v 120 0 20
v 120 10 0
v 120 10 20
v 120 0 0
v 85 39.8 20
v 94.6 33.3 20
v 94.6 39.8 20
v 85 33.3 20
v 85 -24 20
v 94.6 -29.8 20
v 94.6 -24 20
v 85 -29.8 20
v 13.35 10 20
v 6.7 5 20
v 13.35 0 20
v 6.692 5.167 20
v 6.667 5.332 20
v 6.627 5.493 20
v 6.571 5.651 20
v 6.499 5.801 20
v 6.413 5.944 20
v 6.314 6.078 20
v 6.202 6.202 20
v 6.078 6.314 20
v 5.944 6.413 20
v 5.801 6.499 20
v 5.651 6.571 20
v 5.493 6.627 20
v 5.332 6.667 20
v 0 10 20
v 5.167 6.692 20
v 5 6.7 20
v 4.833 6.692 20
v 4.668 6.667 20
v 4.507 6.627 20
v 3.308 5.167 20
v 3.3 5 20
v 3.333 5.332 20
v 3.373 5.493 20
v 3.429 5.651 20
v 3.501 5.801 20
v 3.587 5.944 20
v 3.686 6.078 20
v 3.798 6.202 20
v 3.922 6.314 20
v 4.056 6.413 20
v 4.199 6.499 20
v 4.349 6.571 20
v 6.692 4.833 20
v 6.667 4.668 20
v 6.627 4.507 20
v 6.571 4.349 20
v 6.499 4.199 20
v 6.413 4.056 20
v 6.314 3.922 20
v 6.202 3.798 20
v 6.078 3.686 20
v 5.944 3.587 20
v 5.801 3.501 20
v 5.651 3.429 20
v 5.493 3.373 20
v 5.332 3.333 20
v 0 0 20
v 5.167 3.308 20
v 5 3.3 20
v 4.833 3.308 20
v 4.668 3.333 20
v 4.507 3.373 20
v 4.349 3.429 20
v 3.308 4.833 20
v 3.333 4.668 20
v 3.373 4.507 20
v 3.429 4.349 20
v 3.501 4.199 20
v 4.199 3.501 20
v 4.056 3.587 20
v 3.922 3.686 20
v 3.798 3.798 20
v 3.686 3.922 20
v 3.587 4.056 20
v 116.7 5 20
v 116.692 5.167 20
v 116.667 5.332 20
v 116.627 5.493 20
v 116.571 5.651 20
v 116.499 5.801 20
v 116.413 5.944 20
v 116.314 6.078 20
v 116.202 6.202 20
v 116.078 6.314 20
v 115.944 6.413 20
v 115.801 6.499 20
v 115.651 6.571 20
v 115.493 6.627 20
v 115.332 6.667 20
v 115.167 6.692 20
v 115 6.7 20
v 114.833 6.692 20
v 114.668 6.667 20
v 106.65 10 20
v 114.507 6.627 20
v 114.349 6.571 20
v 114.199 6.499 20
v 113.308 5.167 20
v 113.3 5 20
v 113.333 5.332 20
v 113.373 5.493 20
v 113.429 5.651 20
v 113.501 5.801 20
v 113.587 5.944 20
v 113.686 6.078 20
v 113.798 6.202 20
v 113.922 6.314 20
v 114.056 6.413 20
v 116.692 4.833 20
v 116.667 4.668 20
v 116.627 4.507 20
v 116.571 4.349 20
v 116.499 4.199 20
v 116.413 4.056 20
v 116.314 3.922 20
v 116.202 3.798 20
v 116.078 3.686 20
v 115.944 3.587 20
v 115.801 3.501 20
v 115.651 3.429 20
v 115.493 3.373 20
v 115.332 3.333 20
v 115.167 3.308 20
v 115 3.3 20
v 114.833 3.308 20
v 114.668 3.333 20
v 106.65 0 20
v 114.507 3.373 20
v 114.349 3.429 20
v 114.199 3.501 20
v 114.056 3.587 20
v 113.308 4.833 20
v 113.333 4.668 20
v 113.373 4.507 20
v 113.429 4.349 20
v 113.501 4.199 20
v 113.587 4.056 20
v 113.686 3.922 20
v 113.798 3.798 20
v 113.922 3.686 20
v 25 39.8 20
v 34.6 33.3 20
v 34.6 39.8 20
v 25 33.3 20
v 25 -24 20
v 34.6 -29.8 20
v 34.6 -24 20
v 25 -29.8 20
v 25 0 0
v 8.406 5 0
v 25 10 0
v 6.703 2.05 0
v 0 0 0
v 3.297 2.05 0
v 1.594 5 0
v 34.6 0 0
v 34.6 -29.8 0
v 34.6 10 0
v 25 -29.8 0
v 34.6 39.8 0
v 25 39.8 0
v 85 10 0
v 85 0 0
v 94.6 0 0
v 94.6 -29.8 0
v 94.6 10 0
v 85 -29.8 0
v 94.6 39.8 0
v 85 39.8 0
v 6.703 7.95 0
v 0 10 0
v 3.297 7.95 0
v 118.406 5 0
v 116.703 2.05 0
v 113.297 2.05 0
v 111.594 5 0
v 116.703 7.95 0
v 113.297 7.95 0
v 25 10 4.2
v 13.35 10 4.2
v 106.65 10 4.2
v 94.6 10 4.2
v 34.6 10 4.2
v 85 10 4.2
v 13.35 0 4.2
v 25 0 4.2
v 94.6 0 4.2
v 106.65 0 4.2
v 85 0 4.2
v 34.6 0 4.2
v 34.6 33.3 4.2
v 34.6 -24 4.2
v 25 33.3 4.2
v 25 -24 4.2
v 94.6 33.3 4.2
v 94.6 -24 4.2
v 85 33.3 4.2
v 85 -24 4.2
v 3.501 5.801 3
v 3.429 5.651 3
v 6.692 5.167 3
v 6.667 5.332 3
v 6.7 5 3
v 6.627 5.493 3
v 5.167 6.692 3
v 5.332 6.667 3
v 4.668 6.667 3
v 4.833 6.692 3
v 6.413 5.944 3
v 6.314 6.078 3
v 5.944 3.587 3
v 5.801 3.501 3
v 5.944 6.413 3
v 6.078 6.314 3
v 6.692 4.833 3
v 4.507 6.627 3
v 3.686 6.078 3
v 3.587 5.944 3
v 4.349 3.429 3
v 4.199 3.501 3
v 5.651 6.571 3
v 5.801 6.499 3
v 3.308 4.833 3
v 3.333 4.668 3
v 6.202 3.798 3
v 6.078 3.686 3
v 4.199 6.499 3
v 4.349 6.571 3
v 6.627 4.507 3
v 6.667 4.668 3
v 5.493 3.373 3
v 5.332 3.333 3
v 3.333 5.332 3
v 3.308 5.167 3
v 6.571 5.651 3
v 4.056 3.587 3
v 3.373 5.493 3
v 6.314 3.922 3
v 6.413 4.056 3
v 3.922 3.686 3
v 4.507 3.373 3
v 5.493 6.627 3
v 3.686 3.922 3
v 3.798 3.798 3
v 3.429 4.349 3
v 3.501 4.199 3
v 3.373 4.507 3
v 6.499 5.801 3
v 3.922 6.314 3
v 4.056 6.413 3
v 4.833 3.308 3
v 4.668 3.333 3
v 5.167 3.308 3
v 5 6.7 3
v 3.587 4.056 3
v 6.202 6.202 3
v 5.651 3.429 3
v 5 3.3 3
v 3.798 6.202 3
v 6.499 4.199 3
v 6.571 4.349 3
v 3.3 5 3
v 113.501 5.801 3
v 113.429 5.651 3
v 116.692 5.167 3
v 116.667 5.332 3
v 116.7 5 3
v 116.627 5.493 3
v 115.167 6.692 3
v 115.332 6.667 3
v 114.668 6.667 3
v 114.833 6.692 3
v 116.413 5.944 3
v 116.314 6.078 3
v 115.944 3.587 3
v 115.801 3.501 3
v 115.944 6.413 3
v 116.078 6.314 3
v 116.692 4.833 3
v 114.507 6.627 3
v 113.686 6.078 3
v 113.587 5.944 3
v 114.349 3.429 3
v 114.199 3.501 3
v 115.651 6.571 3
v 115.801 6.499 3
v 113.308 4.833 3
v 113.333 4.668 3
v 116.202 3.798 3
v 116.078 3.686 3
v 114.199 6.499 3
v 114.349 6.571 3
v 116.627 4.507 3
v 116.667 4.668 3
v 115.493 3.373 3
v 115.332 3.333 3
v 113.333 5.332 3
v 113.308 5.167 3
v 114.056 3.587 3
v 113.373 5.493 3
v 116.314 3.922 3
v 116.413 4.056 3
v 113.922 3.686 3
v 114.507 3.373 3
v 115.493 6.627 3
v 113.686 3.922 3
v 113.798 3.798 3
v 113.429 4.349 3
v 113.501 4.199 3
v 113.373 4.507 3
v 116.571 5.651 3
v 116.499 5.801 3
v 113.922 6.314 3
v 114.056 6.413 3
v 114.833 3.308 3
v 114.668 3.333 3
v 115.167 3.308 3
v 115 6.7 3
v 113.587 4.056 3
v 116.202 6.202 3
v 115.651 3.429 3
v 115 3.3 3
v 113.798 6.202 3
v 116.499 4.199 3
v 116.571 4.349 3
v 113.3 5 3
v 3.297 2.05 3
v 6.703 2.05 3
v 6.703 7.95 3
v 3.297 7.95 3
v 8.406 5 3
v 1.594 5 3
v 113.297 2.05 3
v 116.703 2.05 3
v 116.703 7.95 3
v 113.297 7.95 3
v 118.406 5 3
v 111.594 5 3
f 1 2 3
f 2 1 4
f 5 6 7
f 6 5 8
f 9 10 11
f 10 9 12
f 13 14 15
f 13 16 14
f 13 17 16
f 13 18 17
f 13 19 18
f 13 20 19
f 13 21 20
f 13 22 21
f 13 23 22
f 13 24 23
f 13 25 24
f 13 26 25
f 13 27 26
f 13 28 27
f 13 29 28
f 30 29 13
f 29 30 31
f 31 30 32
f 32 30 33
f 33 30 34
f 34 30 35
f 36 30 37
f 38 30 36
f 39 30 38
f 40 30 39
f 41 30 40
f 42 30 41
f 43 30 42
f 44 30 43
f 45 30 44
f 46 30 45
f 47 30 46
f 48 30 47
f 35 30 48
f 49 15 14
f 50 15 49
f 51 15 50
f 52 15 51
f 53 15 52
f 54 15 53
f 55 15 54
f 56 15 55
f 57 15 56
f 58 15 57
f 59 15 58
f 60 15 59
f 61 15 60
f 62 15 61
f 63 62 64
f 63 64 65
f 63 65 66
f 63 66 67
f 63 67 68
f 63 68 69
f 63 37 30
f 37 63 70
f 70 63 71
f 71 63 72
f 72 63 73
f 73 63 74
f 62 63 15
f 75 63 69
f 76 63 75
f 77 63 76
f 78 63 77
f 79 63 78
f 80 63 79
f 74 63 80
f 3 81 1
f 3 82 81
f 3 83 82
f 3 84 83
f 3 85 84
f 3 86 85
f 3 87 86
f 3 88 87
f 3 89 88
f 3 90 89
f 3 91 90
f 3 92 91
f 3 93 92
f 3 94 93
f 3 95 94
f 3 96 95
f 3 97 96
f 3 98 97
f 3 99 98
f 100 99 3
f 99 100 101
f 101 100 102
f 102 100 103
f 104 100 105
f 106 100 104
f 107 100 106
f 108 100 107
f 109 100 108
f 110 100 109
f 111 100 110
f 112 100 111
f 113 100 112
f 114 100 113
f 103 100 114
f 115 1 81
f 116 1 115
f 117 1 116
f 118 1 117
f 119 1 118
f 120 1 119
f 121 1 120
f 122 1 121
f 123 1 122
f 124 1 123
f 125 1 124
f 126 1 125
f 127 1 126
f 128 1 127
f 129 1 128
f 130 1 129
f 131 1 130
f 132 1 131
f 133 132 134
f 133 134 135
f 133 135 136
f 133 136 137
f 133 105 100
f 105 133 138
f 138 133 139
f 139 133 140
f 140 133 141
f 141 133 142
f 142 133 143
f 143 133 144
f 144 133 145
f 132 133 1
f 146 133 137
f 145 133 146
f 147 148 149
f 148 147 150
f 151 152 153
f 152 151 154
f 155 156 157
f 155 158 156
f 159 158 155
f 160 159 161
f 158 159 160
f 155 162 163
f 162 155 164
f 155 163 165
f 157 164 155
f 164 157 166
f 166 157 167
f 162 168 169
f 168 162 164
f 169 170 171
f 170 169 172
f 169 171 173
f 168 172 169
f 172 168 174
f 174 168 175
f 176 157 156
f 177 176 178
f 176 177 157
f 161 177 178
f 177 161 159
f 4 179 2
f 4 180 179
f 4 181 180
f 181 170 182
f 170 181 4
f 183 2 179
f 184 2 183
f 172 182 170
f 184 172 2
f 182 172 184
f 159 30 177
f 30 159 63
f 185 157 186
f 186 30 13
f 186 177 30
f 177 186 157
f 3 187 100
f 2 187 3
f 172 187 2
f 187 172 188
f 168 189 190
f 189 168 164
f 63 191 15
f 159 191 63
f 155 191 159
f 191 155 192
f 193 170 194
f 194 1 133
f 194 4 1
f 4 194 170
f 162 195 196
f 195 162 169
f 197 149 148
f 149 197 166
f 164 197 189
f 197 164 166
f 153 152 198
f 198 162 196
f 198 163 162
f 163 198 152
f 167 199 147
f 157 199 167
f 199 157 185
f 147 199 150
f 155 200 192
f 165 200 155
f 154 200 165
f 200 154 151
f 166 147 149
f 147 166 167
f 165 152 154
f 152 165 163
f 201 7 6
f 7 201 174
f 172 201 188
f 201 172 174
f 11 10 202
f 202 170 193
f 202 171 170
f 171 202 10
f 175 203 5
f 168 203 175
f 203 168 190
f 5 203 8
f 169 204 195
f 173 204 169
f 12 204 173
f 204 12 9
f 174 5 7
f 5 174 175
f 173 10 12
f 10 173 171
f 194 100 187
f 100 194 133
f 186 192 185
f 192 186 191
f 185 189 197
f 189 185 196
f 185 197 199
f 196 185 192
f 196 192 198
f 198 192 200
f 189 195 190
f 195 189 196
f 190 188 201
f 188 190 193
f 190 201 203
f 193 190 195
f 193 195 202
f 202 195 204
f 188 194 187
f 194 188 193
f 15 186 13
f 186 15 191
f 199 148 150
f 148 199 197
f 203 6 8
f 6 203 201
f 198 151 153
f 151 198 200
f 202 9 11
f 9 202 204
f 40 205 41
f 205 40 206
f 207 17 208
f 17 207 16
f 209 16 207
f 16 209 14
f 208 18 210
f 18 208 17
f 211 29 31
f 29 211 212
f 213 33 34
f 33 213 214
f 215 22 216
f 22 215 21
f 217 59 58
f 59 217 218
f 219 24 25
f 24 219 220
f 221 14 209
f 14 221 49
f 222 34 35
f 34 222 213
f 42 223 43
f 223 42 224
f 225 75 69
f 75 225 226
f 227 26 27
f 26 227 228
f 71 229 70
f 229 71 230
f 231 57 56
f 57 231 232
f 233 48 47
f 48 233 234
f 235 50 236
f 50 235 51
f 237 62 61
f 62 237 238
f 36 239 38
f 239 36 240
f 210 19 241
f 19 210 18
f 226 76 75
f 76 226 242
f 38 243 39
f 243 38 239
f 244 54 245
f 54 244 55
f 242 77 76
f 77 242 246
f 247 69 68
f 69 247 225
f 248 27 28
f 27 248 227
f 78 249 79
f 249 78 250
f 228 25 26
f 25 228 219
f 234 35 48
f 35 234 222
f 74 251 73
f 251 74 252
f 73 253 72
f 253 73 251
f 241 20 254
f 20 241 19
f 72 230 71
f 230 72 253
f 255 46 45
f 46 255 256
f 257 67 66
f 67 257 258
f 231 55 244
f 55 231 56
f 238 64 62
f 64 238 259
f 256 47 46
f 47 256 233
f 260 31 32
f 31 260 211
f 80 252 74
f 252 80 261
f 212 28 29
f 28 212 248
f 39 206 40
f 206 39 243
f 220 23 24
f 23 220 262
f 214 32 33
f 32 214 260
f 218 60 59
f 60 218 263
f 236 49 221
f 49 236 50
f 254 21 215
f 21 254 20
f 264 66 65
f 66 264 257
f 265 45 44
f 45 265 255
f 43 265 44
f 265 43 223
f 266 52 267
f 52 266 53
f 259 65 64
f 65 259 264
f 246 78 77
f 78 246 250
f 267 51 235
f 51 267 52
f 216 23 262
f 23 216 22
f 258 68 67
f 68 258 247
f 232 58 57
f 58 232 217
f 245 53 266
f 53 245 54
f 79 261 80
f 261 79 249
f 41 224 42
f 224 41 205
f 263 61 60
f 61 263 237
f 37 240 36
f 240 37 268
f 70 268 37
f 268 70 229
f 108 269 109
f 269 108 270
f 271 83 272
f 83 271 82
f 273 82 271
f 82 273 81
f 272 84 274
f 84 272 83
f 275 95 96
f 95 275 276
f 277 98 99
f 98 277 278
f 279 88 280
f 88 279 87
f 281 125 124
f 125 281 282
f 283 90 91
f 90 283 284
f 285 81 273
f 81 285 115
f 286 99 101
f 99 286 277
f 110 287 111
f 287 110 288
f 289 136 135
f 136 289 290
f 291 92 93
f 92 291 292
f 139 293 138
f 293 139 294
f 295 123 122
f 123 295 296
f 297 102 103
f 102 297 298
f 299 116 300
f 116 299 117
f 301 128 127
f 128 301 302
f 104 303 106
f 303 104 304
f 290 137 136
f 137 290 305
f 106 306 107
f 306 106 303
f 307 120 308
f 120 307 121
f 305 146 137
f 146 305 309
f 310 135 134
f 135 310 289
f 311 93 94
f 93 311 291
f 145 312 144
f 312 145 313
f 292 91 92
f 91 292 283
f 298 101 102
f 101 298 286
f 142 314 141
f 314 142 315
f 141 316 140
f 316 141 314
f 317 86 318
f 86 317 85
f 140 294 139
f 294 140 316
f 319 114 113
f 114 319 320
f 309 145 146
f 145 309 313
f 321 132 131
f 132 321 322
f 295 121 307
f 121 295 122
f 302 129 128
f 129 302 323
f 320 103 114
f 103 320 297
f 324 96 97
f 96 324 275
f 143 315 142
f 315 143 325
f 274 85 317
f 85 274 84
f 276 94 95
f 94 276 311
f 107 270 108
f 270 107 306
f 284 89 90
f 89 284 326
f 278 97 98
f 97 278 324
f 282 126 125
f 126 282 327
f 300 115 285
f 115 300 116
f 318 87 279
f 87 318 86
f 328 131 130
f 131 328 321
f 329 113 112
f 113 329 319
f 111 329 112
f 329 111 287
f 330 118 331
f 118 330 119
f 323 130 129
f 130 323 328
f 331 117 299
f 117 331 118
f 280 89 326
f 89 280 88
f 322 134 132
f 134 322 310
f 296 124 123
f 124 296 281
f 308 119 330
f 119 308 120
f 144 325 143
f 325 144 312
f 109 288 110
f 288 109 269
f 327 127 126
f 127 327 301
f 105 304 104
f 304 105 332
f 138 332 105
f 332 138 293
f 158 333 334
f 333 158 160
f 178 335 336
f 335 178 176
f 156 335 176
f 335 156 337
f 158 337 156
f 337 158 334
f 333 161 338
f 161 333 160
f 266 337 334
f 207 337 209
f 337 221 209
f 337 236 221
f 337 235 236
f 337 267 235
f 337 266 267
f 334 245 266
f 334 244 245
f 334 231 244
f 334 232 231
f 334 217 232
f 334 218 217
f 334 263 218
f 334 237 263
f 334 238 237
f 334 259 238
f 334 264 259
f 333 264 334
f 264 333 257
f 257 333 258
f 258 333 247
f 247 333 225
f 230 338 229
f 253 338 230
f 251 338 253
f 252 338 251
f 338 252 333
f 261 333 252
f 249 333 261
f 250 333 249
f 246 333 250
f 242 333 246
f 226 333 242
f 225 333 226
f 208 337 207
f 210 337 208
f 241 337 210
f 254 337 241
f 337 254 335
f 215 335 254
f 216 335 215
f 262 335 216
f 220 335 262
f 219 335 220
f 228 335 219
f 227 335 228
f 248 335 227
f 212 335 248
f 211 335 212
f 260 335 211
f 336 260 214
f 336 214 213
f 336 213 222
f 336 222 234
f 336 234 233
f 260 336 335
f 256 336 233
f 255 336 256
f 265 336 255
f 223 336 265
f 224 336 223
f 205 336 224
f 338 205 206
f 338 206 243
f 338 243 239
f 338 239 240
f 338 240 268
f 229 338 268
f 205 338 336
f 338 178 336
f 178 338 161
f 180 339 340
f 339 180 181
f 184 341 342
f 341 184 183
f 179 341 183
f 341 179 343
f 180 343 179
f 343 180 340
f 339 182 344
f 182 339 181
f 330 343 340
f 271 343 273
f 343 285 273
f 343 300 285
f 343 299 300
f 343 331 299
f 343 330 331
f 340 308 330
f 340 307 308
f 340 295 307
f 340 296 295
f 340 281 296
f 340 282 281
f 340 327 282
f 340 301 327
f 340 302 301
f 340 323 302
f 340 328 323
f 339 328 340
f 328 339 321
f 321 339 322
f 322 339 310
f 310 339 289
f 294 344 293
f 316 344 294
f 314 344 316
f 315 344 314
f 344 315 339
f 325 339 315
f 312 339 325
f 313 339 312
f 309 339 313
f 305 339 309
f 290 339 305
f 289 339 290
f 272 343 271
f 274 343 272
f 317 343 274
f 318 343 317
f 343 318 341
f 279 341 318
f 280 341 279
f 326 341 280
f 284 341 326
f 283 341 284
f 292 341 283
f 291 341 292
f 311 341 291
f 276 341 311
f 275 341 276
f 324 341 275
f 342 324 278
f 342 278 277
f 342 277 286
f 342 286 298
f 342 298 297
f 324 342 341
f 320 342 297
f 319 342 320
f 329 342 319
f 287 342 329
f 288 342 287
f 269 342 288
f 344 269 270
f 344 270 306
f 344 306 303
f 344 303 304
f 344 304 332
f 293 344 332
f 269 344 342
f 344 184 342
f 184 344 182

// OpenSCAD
difference()
{
    union()
    {
        cube([120.0000, 10.0000, 20.0000]);
        translate([25.0000, -29.8000, 0.0000])
        {
            cube([9.6000, 69.6000, 20.0000]);
        }
        translate([85.0000, -29.8000, 0.0000])
        {
            cube([9.6000, 69.6000, 20.0000]);
        }
    }
    translate([13.3500, -24.0000, 4.2000])
    {
        cube([93.3000, 57.3000, 20.0000]);
    }
    translate([5.0000, 5.0000, 0.0000])
    {
        cylinder(d = 3.4000, h = 70.0000, $fn = 64);
    }
    translate([115.0000, 5.0000, 0.0000])
    {
        cylinder(d = 3.4000, h = 70.0000, $fn = 64);
    }
    translate([5.0000, 5.0000, -2.0000])
    {
        cylinder(d = 6.8127, h = 5.0000, $fn = 6);
    }
    translate([115.0000, 5.0000, -2.0000])
    {
        cylinder(d = 6.8127, h = 5.0000, $fn = 6);
    }
}
